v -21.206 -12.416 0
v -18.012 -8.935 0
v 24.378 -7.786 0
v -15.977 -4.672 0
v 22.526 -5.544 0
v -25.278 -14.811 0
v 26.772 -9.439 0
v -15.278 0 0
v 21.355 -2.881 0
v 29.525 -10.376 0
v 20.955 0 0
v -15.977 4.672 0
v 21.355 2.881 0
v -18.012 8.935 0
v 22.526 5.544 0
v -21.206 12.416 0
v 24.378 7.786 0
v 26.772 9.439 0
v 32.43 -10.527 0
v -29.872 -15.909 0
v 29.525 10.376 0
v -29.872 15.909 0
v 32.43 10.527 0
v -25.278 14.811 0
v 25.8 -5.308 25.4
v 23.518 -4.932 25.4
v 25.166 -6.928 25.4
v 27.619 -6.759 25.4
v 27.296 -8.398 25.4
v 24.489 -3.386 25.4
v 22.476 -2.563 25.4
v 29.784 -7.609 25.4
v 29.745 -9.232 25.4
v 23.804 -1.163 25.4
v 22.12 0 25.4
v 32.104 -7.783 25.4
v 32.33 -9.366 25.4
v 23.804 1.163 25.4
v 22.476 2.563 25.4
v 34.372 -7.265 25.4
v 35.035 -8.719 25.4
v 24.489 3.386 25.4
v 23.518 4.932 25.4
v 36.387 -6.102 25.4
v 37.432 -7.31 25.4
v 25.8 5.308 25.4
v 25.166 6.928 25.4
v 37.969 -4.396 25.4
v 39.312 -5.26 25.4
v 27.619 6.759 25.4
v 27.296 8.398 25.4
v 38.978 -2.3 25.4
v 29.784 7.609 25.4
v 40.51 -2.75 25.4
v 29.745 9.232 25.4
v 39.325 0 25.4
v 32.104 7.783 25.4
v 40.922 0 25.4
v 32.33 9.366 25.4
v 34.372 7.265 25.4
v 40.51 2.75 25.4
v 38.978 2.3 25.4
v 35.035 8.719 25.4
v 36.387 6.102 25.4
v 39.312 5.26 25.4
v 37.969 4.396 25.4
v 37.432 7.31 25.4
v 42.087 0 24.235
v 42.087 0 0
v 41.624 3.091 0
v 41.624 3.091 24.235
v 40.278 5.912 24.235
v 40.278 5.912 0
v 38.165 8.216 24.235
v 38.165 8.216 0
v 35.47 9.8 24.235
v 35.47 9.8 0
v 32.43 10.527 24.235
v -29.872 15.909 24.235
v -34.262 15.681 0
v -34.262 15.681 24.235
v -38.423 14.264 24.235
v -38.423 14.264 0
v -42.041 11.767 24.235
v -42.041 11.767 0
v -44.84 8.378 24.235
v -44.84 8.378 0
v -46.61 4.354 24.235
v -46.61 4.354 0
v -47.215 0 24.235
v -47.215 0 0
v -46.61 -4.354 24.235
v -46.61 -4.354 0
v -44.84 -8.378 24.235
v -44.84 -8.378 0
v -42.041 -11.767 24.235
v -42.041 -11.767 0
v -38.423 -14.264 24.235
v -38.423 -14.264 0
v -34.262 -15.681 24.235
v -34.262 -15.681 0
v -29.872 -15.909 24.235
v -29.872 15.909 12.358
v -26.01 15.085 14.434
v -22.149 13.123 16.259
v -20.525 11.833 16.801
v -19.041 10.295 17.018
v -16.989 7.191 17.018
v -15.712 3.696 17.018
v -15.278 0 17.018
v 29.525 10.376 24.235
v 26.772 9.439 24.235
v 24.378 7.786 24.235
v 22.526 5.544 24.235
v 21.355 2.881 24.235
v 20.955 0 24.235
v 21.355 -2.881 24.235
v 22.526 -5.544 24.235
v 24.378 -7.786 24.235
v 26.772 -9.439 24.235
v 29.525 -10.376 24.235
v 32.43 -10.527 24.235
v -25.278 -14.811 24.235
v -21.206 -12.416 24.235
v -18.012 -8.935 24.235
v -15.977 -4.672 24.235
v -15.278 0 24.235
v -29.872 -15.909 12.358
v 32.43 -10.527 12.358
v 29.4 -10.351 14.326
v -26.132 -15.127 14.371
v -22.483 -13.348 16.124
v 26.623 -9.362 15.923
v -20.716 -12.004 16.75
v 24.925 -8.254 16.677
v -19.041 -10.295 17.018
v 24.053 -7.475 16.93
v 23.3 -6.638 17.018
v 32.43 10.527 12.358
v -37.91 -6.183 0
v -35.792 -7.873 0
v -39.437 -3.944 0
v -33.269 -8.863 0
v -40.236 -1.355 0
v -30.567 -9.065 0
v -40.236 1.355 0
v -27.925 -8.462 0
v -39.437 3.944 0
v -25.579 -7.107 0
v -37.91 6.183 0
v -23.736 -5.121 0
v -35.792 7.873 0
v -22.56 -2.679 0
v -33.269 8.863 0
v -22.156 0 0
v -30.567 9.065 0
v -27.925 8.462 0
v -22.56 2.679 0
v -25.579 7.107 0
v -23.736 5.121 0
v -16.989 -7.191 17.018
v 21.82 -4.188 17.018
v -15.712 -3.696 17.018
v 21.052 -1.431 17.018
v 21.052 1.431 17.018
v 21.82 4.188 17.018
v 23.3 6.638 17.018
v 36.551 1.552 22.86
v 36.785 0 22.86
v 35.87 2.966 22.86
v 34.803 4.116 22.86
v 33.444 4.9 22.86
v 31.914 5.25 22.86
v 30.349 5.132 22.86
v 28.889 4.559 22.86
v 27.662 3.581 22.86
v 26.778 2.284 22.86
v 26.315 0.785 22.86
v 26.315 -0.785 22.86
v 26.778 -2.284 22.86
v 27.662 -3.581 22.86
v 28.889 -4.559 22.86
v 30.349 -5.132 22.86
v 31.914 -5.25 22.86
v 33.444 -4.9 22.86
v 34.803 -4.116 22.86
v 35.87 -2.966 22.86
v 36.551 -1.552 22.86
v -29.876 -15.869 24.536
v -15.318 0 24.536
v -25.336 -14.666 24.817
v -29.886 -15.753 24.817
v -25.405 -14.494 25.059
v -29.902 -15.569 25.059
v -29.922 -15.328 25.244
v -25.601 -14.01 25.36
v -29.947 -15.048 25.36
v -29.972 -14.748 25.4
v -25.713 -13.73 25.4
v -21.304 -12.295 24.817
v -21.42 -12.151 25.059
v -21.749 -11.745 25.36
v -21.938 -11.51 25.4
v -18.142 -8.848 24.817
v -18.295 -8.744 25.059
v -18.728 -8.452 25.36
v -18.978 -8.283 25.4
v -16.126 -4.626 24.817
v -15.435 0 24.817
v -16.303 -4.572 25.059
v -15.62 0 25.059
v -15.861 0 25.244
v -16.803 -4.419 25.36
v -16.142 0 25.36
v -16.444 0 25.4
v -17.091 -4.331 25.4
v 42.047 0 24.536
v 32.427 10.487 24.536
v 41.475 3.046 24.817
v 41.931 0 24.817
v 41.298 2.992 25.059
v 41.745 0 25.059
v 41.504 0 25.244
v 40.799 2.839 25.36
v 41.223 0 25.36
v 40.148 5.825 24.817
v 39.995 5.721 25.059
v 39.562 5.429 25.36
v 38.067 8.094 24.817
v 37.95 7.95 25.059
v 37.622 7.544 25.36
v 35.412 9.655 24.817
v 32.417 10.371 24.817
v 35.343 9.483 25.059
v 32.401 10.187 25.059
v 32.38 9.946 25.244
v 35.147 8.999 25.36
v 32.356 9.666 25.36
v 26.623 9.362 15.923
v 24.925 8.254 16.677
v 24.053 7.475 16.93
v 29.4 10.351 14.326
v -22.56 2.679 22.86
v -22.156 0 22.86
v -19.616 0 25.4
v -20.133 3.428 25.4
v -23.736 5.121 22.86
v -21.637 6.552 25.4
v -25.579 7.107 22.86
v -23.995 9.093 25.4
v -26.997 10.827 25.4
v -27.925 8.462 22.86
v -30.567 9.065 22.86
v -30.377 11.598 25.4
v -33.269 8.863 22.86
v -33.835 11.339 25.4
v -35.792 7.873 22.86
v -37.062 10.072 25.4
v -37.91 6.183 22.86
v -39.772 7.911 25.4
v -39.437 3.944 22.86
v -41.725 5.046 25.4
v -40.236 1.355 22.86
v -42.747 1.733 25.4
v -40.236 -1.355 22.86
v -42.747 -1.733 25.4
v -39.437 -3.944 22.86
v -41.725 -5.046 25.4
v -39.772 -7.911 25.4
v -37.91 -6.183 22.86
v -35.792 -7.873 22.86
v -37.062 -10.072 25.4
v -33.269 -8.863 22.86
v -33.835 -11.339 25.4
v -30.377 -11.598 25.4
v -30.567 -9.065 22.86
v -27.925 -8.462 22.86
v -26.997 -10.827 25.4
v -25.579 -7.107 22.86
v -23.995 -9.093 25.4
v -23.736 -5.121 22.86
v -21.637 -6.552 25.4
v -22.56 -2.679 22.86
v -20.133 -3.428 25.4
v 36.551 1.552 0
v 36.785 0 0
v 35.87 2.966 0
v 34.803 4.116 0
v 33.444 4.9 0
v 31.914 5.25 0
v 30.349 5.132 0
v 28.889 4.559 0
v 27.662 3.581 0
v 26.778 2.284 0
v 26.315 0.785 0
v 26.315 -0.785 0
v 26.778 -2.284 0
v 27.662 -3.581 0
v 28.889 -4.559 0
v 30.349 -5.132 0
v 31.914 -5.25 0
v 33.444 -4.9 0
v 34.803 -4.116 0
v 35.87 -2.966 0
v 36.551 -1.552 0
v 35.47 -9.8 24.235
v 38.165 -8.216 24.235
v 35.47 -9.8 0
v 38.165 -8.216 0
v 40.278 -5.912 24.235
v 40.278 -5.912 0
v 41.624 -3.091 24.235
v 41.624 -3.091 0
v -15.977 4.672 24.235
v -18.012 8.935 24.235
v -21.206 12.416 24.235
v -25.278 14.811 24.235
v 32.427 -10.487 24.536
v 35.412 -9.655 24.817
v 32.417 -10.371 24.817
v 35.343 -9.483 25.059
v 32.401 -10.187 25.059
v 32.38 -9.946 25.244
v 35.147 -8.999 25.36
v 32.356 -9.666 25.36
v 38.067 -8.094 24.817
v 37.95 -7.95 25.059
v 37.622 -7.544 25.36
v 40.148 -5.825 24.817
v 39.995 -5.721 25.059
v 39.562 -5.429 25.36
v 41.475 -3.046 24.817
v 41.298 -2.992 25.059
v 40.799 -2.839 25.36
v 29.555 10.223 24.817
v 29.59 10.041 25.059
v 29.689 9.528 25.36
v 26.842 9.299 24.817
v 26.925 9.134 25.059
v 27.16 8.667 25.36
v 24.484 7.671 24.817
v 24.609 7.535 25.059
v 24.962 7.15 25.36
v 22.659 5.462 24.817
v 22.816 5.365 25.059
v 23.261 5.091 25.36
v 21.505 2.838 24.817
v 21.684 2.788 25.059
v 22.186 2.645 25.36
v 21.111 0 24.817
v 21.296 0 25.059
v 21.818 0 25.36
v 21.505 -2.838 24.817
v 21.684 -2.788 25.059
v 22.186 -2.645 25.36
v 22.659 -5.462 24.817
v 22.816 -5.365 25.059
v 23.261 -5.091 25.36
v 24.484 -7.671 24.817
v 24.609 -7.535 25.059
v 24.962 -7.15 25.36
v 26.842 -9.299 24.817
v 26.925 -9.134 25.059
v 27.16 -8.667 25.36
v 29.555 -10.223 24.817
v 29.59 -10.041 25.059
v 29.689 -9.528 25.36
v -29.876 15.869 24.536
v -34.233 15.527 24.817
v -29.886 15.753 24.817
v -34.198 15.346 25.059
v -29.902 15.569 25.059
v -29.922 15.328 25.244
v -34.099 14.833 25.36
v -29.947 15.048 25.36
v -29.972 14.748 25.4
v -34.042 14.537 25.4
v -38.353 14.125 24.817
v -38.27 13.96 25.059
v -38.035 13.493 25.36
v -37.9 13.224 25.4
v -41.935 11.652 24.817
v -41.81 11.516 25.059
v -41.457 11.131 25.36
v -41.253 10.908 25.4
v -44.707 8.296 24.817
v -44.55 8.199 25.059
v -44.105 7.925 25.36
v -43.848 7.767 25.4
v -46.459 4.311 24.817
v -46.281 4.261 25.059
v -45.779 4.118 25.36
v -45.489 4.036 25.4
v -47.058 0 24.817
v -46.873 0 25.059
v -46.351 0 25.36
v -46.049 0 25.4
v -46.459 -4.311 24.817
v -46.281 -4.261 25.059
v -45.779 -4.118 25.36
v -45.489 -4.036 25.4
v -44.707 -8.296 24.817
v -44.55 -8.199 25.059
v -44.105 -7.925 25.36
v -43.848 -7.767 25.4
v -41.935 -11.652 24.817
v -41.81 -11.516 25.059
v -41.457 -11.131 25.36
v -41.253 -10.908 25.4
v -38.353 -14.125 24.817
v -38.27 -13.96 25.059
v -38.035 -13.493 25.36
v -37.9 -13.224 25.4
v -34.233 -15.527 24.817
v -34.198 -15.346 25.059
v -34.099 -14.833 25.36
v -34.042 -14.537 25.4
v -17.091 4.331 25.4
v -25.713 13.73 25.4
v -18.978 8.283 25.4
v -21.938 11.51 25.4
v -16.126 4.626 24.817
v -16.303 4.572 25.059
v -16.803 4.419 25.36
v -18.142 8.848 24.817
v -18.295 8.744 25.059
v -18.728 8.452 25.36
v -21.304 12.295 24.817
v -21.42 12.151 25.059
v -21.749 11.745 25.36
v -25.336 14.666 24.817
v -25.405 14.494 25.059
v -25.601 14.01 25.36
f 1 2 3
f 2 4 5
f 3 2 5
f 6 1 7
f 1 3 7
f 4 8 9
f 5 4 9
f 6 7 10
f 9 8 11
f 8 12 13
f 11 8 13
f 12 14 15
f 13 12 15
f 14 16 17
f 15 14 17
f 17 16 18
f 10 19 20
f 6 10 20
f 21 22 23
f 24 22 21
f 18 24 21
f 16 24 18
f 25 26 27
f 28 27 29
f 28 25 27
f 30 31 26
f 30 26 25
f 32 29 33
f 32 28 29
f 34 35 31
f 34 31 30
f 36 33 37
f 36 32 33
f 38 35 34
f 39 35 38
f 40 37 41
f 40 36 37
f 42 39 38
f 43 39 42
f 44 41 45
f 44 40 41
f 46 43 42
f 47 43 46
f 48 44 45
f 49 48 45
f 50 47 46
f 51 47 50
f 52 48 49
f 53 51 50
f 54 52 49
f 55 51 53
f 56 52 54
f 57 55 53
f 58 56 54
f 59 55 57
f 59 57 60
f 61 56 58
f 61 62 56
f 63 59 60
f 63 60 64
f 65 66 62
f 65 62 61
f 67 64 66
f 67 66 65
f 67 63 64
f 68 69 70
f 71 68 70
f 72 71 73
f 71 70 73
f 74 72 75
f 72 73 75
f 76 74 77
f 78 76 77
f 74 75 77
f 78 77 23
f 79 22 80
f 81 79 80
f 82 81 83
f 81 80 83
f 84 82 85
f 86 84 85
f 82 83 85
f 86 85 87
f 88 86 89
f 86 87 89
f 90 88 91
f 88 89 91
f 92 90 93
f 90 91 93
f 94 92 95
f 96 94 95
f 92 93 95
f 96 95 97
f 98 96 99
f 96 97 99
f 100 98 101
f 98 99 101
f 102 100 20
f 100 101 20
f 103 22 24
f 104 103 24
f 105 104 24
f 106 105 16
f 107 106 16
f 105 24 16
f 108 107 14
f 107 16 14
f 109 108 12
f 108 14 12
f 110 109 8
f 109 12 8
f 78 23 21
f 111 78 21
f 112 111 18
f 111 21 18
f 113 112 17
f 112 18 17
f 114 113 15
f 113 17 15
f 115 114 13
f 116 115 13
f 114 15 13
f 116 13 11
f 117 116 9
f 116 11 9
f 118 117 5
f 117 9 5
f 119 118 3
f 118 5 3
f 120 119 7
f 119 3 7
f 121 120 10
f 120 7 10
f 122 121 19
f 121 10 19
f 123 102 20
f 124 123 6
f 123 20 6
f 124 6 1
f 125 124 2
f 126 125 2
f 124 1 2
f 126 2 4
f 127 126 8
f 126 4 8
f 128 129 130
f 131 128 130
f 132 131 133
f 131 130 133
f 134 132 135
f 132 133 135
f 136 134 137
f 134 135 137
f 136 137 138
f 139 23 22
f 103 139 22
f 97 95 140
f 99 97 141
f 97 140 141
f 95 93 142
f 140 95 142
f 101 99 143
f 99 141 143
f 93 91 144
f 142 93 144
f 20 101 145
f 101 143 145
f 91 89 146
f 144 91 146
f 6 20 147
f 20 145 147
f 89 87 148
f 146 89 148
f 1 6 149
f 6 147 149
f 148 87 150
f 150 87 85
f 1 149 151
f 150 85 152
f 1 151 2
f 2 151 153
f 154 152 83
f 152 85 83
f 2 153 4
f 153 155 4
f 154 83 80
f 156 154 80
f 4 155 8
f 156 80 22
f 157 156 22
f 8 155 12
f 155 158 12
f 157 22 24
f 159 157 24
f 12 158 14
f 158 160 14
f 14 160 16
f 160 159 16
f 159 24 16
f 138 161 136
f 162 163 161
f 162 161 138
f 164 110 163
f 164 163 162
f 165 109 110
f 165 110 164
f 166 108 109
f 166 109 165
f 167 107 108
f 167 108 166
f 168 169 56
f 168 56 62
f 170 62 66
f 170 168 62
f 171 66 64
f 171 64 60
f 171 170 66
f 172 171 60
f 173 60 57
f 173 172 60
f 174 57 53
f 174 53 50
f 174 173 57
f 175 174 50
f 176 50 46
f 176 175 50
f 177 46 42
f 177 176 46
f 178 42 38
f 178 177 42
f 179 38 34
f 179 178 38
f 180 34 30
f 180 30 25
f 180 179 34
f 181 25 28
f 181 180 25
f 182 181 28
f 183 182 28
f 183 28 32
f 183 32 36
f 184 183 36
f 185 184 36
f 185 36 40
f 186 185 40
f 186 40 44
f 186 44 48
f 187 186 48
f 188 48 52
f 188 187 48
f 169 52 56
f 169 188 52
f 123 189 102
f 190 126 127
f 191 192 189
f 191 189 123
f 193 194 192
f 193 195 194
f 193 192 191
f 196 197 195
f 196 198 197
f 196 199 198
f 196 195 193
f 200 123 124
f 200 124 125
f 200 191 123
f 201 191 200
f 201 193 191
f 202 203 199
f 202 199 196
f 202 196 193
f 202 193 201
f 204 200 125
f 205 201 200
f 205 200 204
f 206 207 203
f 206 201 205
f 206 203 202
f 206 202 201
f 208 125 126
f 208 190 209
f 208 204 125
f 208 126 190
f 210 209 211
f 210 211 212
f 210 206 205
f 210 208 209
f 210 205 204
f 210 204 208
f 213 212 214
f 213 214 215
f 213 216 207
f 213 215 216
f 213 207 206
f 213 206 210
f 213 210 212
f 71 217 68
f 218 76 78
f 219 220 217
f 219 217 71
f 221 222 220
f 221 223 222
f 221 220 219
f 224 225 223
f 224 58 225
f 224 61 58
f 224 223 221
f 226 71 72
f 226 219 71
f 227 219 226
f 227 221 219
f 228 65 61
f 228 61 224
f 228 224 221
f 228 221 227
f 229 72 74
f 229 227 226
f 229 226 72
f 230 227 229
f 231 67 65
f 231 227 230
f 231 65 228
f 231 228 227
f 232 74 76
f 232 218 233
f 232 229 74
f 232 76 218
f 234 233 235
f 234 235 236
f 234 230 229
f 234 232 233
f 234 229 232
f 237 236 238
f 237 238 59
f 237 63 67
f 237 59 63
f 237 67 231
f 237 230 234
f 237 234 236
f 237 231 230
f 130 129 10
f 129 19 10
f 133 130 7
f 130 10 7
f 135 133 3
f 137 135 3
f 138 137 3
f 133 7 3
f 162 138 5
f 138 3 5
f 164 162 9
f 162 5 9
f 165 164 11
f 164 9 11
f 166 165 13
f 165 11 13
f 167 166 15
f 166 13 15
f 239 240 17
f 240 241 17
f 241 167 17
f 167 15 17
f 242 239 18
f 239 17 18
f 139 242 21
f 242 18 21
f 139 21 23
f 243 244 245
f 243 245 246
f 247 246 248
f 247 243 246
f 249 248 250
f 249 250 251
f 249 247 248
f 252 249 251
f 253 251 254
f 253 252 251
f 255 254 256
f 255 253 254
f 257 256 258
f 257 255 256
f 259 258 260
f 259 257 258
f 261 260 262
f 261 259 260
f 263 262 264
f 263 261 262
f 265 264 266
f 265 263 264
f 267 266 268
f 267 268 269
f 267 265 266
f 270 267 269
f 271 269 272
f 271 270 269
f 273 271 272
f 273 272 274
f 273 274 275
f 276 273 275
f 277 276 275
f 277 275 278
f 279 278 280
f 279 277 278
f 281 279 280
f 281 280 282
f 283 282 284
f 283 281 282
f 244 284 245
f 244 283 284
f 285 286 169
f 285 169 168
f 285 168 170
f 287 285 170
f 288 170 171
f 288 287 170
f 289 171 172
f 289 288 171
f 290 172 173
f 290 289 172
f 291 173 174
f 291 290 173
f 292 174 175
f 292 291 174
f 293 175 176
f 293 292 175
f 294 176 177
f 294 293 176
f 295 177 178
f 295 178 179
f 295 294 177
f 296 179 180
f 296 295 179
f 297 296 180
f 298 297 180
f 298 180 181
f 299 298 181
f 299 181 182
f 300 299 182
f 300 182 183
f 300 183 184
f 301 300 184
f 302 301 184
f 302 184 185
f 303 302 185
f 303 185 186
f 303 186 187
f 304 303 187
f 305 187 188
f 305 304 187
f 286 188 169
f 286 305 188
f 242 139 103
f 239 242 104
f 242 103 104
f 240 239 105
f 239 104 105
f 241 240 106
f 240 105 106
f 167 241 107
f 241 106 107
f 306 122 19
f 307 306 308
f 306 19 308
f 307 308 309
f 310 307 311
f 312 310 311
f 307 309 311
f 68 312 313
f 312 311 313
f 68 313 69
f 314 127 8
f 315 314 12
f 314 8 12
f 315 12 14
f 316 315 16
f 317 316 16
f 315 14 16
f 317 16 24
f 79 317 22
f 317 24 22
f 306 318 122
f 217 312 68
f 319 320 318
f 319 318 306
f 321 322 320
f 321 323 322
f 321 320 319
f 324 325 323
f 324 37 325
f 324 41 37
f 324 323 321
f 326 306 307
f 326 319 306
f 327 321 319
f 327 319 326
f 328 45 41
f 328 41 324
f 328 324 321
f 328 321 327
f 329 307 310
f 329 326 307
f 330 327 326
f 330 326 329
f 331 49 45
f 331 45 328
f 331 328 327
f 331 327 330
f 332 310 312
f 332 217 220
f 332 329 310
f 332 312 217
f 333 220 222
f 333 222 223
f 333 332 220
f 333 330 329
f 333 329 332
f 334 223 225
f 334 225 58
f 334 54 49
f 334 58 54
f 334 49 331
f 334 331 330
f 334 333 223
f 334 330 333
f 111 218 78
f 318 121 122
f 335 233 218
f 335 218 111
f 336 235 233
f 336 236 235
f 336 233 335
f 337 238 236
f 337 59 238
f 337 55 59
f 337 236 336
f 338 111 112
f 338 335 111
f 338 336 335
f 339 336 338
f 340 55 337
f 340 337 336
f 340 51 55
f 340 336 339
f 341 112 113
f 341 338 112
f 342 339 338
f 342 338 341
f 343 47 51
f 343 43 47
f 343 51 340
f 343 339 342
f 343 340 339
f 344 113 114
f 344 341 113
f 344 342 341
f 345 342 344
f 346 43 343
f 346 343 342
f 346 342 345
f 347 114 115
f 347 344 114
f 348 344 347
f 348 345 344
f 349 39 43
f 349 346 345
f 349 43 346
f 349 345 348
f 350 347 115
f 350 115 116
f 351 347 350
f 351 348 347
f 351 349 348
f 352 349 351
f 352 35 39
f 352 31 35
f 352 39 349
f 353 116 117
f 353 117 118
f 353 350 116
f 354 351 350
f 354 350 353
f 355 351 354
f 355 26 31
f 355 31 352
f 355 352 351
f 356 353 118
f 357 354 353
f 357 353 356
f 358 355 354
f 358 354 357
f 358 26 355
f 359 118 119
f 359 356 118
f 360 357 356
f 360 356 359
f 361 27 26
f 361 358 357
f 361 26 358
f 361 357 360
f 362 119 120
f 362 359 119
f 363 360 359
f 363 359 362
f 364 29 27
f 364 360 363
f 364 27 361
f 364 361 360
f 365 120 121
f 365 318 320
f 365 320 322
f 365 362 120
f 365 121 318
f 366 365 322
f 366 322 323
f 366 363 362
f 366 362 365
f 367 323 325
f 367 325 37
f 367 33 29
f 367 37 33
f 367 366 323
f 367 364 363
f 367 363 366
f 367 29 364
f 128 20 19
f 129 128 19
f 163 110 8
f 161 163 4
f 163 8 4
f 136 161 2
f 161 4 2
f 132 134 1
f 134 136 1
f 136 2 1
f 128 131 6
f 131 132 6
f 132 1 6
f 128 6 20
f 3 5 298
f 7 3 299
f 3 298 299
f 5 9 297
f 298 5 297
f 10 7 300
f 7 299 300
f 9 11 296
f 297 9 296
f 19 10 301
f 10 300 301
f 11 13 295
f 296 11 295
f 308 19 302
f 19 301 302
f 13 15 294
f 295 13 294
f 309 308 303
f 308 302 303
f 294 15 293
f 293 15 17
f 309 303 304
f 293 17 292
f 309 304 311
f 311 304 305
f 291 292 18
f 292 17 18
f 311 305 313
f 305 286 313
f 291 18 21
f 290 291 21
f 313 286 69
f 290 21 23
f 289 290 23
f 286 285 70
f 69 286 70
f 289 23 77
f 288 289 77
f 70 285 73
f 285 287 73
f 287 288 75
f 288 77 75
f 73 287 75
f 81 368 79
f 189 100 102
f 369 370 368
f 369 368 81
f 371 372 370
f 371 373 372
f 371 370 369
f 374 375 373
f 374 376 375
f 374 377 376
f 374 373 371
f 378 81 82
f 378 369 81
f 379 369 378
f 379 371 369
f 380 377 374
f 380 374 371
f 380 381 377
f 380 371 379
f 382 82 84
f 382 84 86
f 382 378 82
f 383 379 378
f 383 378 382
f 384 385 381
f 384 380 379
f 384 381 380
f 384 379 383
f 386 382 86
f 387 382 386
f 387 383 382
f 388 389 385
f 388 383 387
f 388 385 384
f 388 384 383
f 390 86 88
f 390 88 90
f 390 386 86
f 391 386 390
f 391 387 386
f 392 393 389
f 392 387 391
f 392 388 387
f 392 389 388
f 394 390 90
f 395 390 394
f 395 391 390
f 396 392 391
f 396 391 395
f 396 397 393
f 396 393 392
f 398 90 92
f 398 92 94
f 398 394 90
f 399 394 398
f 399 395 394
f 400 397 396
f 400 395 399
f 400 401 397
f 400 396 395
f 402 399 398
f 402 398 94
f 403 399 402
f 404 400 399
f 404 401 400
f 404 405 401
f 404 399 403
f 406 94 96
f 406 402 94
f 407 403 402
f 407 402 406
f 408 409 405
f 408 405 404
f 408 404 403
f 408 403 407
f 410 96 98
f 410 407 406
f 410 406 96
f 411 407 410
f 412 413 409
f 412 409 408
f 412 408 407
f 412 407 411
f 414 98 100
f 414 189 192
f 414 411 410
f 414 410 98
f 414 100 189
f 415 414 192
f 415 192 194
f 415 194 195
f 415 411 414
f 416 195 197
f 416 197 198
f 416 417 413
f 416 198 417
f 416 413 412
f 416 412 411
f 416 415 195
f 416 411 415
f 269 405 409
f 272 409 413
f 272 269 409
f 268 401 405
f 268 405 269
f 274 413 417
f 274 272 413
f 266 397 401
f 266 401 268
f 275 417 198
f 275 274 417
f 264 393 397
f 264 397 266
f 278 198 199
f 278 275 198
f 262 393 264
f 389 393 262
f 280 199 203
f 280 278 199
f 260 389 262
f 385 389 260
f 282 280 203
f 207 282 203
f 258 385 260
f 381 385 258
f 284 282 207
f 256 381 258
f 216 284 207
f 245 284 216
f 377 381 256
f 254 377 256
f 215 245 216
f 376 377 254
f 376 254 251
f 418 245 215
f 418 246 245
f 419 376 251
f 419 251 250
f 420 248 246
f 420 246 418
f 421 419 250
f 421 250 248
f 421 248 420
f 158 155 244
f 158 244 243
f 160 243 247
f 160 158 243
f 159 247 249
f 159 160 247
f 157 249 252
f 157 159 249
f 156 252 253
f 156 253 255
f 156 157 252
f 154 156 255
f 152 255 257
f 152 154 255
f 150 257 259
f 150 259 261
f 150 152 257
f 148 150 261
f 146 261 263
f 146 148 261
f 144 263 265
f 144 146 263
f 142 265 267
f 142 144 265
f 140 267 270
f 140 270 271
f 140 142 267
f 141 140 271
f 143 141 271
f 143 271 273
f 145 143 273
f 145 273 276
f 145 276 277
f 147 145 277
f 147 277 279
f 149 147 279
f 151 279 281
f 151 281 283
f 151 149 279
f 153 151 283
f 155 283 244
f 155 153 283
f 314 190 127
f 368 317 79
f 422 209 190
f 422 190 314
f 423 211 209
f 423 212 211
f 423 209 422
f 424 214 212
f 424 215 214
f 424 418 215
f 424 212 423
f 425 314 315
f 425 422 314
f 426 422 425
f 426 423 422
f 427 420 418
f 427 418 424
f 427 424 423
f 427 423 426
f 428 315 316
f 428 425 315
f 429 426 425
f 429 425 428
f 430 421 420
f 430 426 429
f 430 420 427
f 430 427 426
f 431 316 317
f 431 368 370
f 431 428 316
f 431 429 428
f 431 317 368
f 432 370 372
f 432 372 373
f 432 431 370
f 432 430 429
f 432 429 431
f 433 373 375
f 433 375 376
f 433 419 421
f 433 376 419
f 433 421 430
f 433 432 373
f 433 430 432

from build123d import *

# Parameters (mm, degrees)
F0_R     = 9.090565
F0_R_2   = 5.264345
F1_DEPTH = 25.4
F2_DEPTH = 17.018
F3_R     = 1.165099
F4_R     = 4.660398
F5_SIZE  = 2.54


with BuildPart() as f1:
    # F0 (on Top) → F1 (new body)
    with BuildSketch(Plane.XY):
        with BuildLine():
            ThreePointArc((-29.872189, -15.90883), (-19.479503, -10.794312), (-15.278428, 0))
            ThreePointArc((-15.278428, 0), (-19.479503, 10.794312), (-29.872189, 15.90883))
            ThreePointArc((-29.872189, 15.90883), (-47.214591, 0), (-29.872189, -15.90883))
        make_face()
        with Locations((-31.246509, 0)):
            Circle(F0_R, mode=Mode.SUBTRACT)
        with BuildLine():
            ThreePointArc((42.086694, 0), (39.306888, 7.142479), (32.430162, 10.526699))
            ThreePointArc((32.430162, 10.526699), (20.954883, 0), (32.430162, -10.526699))
            ThreePointArc((32.430162, -10.526699), (39.306888, -7.142479), (42.086694, 0))
        make_face()
        with Locations((31.520789, 0)):
            Circle(F0_R_2, mode=Mode.SUBTRACT)
    extrude(amount=F1_DEPTH)

    # F3
    f3_edges = [f1.edges().sort_by_distance(p)[0] for p in [
        (-32.62083, 15.90883, 25.4),
        (30.611416, 10.526699, 25.4),
    ]]
    fillet(f3_edges, radius=F3_R)

    # F5
    f5_edges = [f1.edges().sort_by_distance(p)[0] for p in [
        (-40.337074, 0, 25.4),
        (26.256444, 0, 25.4),
    ]]
    chamfer(f5_edges, length=F5_SIZE)


with BuildPart() as f2:
    # F0 (on Top) → F2 (new body)
    with BuildSketch(Plane.XY):
        with BuildLine():
            ThreePointArc((-29.872189, 15.90883), (-19.479503, 10.794312), (-15.278428, 0))
            ThreePointArc((-15.278428, 0), (-19.479503, -10.794312), (-29.872189, -15.90883))
            Line((-29.872189, -15.90883), (32.430162, -10.526699))
            ThreePointArc((32.430162, -10.526699), (20.954883, 0), (32.430162, 10.526699))
            Line((32.430162, 10.526699), (-29.872189, 15.90883))
        make_face()
    extrude(amount=F2_DEPTH)

    # F4
    f4_edges = [f2.edges().sort_by_distance(p)[0] for p in [
        (1.278986, -13.217764, 17.018),
        (1.278986, 13.217764, 17.018),
    ]]
    fillet(f4_edges, radius=F4_R)


solid = Compound([f1.part, f2.part])
